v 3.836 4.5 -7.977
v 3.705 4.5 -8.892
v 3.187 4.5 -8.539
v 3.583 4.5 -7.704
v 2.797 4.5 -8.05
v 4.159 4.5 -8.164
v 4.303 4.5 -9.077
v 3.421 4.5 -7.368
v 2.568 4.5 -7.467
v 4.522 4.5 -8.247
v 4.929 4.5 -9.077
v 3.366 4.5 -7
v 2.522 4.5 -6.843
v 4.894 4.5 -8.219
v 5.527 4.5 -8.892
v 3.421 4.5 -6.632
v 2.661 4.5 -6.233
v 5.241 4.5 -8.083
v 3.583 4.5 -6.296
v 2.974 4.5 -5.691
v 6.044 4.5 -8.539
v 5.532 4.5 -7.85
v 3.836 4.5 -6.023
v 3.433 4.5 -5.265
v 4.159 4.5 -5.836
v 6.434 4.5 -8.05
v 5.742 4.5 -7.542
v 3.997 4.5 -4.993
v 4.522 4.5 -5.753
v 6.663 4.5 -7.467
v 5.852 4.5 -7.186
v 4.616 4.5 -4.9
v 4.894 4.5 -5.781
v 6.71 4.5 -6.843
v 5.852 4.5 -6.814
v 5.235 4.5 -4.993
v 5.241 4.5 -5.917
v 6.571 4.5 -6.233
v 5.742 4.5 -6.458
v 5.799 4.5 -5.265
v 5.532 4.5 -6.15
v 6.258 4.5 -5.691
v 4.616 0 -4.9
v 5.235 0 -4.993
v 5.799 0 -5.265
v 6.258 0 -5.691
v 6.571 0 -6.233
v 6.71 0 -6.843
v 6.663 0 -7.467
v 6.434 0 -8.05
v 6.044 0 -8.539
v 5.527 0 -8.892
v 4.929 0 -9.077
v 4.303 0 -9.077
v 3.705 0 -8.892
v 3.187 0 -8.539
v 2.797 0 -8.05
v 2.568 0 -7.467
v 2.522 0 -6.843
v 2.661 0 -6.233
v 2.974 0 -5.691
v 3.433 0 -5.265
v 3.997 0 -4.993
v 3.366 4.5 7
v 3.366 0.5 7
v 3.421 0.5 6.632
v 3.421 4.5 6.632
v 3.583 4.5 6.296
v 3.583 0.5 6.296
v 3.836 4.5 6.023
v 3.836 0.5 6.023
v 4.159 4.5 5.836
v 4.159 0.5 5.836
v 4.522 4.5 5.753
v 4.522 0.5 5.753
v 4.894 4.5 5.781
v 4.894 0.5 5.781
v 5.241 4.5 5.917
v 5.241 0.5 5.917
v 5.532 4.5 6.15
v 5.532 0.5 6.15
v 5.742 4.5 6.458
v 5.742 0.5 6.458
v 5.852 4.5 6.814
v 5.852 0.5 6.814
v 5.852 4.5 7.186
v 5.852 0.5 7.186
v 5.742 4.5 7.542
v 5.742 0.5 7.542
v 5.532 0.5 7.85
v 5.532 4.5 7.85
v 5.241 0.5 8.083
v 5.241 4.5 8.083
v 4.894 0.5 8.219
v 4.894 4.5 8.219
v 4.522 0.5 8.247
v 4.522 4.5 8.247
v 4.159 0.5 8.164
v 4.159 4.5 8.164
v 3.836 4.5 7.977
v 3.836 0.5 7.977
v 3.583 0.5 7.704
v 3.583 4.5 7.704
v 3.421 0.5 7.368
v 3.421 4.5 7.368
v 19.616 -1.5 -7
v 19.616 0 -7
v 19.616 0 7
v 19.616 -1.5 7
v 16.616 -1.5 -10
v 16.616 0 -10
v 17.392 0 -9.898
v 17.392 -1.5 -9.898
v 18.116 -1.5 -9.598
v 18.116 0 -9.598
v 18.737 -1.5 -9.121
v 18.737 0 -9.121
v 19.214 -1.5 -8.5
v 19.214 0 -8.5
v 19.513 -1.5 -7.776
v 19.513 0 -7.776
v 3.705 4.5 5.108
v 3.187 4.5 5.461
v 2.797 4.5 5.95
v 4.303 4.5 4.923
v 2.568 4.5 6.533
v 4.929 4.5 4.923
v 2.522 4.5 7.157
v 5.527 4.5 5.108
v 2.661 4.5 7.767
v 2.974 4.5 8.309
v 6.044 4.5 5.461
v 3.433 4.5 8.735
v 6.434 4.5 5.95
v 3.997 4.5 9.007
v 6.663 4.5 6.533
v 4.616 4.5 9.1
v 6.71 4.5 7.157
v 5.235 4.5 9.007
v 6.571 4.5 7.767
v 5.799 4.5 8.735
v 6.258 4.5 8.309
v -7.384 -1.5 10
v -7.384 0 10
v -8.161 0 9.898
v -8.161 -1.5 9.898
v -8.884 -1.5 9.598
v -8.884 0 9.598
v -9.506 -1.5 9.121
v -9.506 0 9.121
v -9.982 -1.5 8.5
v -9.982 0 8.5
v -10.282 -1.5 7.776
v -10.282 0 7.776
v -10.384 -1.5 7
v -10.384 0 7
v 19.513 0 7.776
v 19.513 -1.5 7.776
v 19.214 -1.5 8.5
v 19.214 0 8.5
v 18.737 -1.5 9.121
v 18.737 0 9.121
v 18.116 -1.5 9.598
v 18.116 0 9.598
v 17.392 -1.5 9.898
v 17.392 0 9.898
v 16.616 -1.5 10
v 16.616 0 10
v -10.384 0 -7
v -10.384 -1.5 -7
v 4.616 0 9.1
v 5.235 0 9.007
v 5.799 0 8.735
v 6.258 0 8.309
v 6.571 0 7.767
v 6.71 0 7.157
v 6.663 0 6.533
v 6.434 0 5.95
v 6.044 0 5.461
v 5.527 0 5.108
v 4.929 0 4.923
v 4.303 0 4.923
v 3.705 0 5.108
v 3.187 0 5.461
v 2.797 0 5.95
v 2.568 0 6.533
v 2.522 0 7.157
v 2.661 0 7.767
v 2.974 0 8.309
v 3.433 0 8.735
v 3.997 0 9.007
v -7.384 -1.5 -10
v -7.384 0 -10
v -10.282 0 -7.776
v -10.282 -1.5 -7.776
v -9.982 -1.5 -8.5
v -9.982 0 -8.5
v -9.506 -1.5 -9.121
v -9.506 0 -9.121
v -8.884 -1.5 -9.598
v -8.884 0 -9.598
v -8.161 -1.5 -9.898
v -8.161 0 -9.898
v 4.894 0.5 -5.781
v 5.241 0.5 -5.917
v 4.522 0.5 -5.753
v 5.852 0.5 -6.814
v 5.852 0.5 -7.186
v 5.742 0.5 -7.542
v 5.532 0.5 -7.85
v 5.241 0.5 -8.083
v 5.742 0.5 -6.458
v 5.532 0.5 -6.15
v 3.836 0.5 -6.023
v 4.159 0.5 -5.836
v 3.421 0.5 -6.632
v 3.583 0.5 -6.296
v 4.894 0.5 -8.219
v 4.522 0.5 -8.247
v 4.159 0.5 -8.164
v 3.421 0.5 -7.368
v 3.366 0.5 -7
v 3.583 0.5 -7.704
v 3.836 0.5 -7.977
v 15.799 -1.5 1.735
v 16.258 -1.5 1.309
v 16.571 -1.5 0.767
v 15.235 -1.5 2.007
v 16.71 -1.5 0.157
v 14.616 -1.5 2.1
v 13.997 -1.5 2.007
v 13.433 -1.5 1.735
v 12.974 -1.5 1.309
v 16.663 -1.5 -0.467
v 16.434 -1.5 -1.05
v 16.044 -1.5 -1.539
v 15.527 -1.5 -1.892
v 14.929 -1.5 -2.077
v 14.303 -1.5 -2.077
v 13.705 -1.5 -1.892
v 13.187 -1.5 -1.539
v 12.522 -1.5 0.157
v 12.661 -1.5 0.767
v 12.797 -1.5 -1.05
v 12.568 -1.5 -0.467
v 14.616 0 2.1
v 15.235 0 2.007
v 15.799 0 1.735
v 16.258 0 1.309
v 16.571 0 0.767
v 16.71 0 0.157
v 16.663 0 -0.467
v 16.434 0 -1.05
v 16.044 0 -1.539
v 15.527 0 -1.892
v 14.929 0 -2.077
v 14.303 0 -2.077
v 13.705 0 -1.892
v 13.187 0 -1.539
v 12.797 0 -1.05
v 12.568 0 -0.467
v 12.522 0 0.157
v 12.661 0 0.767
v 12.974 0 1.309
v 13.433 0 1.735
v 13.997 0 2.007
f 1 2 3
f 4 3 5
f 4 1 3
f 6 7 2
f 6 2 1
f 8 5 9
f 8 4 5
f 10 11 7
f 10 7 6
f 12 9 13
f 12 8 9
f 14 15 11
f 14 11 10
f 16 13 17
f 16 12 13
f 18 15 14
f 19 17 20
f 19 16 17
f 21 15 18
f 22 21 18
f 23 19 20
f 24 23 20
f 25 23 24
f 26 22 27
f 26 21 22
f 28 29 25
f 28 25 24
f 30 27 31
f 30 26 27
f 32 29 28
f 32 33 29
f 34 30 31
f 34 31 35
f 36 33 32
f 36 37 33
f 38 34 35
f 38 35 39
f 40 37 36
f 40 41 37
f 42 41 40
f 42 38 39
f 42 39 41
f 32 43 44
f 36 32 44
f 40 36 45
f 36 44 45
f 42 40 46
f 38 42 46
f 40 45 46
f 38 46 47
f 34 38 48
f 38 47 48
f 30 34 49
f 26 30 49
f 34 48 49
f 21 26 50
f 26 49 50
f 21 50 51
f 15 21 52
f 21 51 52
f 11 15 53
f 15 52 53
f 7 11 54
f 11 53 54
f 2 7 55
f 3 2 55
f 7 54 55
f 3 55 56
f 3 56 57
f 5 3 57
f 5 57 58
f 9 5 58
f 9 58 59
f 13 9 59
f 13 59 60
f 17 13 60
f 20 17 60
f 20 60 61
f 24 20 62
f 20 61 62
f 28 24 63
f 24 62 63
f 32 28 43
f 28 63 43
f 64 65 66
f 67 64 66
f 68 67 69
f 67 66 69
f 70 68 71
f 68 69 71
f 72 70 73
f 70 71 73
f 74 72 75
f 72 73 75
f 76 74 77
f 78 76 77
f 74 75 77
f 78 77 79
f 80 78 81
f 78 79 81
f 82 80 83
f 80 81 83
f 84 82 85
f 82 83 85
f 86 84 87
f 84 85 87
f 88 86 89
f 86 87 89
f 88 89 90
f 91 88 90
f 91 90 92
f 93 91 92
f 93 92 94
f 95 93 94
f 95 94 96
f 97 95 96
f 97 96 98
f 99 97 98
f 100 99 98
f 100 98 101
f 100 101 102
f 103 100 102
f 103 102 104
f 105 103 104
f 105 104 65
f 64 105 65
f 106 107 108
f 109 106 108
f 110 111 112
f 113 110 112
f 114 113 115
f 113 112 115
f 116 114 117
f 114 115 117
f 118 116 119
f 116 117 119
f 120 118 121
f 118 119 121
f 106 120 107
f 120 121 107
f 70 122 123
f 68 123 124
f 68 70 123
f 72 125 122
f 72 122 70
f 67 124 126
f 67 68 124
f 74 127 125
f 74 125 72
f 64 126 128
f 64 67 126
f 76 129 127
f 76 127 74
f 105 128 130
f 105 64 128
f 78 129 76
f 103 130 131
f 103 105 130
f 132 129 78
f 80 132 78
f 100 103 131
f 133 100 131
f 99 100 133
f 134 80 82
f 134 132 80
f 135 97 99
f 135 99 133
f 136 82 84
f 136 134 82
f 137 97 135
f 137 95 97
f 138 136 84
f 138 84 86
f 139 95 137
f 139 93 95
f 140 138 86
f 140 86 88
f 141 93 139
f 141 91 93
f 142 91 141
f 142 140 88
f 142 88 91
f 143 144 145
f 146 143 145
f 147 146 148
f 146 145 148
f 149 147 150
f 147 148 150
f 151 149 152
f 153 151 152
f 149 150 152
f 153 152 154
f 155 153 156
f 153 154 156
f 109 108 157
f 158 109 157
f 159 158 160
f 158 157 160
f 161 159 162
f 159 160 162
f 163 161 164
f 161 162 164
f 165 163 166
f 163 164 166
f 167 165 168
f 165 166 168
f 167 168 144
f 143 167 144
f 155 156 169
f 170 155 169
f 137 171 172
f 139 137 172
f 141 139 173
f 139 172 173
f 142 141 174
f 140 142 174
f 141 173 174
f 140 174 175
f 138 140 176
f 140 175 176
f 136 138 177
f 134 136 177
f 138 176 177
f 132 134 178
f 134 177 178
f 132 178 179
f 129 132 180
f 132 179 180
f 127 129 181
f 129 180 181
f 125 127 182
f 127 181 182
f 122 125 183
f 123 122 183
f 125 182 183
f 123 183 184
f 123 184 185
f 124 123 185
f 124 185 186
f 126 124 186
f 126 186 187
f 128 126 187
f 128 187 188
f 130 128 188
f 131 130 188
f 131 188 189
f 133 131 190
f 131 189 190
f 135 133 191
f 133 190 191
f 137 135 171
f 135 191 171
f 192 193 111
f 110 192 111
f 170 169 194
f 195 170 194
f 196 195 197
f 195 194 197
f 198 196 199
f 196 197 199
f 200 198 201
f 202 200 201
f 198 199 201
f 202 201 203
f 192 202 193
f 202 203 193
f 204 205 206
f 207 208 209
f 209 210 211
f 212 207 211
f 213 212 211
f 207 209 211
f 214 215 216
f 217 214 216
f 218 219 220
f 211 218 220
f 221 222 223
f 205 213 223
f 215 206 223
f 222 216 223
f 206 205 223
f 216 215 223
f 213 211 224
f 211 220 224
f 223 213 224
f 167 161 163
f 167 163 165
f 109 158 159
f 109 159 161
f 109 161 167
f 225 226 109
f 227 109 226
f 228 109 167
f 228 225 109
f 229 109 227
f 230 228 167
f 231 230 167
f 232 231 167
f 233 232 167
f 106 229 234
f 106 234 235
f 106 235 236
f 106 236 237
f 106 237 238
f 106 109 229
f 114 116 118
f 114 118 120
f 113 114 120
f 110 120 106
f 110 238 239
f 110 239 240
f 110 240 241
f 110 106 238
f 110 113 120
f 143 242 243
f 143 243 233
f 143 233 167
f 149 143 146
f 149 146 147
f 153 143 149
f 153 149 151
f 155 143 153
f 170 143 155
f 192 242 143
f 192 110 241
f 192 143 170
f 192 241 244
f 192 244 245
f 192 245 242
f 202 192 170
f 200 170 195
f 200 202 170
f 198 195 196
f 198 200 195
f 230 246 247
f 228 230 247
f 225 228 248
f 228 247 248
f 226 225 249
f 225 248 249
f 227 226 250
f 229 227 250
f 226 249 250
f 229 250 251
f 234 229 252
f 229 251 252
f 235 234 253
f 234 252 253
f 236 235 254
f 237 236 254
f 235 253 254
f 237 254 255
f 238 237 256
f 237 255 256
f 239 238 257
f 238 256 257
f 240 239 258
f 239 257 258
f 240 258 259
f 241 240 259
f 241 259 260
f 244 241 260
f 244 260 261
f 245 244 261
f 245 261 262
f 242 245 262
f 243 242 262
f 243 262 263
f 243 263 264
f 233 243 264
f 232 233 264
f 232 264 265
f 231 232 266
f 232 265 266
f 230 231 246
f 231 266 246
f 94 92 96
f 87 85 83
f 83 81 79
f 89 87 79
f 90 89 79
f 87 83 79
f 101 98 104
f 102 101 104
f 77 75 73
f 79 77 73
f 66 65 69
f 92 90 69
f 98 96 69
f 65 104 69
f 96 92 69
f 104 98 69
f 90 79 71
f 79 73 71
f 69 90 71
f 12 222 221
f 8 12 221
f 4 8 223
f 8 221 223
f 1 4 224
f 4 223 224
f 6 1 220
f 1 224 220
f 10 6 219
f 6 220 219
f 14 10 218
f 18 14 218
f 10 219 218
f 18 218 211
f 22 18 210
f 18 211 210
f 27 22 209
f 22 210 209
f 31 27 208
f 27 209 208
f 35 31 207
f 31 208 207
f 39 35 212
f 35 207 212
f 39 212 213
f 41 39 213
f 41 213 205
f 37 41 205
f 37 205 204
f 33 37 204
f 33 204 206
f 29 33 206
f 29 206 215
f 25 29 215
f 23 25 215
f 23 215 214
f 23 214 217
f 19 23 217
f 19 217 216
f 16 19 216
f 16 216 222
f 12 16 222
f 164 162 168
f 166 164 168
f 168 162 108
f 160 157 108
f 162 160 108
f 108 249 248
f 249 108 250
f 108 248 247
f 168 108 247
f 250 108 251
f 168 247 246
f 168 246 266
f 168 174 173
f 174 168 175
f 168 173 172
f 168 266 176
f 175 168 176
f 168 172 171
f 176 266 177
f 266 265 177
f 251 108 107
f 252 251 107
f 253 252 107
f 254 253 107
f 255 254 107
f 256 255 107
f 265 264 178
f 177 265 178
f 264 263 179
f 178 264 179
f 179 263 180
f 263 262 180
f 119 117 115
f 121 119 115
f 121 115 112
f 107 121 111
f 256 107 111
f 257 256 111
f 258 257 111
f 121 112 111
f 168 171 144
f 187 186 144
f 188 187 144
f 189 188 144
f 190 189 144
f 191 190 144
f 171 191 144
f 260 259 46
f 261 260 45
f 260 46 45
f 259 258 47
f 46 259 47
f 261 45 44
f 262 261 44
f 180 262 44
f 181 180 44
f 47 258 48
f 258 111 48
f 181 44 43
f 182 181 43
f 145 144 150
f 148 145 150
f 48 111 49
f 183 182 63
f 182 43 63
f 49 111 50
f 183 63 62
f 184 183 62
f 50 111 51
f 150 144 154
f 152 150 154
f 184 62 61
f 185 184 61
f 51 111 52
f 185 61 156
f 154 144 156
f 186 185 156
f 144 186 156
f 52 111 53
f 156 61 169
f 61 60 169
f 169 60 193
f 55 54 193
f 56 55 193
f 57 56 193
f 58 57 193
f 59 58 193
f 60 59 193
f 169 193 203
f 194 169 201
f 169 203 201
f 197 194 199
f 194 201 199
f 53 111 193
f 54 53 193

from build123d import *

# Parameters (mm, degrees)
SKETCH_1_R             = 2.1
SM_BASE_FLANGE_1_DEPTH = 1.5
SKETCH_2_R             = 2.1
EXTRUDE_1_DEPTH        = 4.5
HOLE_WIZARD_M3_1_D     = 2.5
HOLE_WIZARD_M3_1_DEPTH = 4


# Sheet-metal steps are written as plain solids
with BuildPart() as part:
    # Sketch 1 → 基体-法兰1 (new body)
    with BuildSketch(Plane(origin=(0, 0, 0), x_dir=(1, 0, 0), z_dir=(0, 1, 0))):
        with BuildLine():
            Line((-7.384325118, 10), (16.615674882, 10))
            ThreePointArc((16.615674882, 10), (18.736995226, 9.121320344), (19.615674882, 7))
            Line((19.615674882, 7), (19.615674882, -7))
            ThreePointArc((19.615674882, -7), (18.736995226, -9.121320344), (16.615674882, -10))
            Line((16.615674882, -10), (-7.384325118, -10))
            ThreePointArc((-7.384325118, -10), (-9.505645461, -9.121320344), (-10.384325118, -7))
            Line((-10.384325118, -7), (-10.384325118, 7))
            ThreePointArc((-10.384325118, 7), (-9.505645461, 9.121320344), (-7.384325118, 10))
        make_face()
        with Locations(Location((14.615674882, 0, 0), (0, 0, 270))):
            Circle(SKETCH_1_R, mode=Mode.SUBTRACT)
    extrude(amount=-SM_BASE_FLANGE_1_DEPTH)

    # Sketch 2 → 凸台-拉伸1 (add)
    with BuildSketch(Plane(origin=(0, 0, 0), x_dir=(1, 0, 0), z_dir=(0, 1, 0))):
        with Locations(Location((4.615674882, 7, 0), (0, 0, 270))):
            Circle(SKETCH_2_R)
        with Locations(Location((4.615674882, -7, 0), (0, 0, 270))):
            Circle(SKETCH_2_R)
    extrude(amount=EXTRUDE_1_DEPTH)

    # M3 螺纹孔1
    with Locations(Plane(origin=(0, 4.5, 0), x_dir=(1, 0, 0), z_dir=(0, 1, 0))):
        with Locations((4.615674882, 7), (4.615674882, -7)):
            Hole(HOLE_WIZARD_M3_1_D / 2, depth=HOLE_WIZARD_M3_1_DEPTH)


solid = part.part
